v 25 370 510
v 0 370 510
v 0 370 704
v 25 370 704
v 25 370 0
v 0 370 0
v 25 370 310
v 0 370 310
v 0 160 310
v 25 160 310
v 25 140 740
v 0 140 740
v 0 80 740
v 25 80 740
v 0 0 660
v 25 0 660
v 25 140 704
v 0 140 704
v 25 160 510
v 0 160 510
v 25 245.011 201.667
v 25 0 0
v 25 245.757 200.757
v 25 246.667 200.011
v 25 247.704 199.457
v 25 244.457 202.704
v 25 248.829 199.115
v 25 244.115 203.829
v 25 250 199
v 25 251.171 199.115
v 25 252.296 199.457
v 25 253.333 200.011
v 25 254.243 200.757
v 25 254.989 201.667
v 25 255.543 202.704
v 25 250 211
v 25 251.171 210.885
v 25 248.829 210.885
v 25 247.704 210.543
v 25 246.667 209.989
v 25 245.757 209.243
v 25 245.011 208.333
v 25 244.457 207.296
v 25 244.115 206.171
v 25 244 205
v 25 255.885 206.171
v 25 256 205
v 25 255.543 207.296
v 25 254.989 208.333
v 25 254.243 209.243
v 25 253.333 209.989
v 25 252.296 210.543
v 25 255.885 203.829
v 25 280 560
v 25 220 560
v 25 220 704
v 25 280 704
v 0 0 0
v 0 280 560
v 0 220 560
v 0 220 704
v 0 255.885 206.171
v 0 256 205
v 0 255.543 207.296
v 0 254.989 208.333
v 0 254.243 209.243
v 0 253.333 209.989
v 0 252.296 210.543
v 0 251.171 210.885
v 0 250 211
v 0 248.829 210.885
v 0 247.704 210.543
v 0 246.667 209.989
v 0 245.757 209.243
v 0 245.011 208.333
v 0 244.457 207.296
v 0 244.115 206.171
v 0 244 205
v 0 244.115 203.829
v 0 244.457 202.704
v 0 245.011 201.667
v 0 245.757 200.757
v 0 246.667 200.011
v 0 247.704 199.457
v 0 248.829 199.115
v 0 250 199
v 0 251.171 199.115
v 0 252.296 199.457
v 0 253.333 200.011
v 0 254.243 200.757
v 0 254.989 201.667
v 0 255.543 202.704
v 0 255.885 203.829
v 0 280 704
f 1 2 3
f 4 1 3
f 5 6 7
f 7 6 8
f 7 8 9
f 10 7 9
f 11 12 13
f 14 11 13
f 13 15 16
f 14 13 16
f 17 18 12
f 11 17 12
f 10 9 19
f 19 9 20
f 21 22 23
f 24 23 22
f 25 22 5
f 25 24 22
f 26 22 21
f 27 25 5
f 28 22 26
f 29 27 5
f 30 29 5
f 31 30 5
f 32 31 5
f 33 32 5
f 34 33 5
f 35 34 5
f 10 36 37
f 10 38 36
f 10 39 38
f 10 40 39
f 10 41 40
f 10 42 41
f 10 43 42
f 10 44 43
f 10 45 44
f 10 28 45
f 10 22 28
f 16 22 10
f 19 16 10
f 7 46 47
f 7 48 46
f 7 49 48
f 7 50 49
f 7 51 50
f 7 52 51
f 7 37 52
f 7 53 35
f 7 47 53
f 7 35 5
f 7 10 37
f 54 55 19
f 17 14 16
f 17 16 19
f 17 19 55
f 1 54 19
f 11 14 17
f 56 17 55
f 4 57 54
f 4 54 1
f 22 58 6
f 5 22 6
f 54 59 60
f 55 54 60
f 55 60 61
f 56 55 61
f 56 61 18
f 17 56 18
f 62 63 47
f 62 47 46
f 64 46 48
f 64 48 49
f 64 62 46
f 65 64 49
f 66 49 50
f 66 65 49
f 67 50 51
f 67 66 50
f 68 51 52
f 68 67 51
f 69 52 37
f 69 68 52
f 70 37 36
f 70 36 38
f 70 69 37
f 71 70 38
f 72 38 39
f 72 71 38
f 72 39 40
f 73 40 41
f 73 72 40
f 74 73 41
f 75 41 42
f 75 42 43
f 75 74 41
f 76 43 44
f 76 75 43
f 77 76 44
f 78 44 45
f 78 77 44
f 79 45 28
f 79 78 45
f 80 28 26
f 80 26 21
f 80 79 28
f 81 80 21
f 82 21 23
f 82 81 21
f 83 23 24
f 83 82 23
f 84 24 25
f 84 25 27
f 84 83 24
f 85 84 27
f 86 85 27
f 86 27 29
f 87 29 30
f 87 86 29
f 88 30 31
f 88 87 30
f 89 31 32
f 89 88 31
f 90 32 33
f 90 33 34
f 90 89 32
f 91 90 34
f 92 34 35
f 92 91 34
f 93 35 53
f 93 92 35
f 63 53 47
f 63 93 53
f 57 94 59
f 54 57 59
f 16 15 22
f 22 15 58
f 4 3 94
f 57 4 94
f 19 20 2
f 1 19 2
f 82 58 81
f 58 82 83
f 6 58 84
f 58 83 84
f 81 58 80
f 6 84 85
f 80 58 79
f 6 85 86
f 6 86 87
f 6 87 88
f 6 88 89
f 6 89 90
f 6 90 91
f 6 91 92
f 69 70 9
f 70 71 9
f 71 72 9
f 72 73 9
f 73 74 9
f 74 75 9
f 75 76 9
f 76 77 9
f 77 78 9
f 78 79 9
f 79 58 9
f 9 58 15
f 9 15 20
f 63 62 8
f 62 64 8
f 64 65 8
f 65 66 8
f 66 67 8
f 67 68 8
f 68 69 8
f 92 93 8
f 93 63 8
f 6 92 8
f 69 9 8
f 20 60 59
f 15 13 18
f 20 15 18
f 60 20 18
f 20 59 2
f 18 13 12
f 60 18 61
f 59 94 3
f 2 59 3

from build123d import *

# Parameters (mm, degrees)
F0_R     = 6
F1_DEPTH = 25
F2_SIZE  = 80


with BuildPart() as f1:
    # F0 (on Right) → F1 (new body)
    with BuildSketch(Plane.YZ):
        Polygon((0, 740), (0, 0), (370, 0), (370, 310), (160, 310), (160, 510), (370, 510), (370, 704), (280, 704), (280, 560), (220, 560), (220, 704), (140, 704), (140, 740), align=None)
        with Locations((250, 205)):
            Circle(F0_R, mode=Mode.SUBTRACT)
    extrude(amount=F1_DEPTH)

    # F2
    f2_edges = [f1.edges().sort_by_distance(p)[0] for p in [
        (12.5, 0, 740),
    ]]
    chamfer(f2_edges, length=F2_SIZE)


solid = f1.part
